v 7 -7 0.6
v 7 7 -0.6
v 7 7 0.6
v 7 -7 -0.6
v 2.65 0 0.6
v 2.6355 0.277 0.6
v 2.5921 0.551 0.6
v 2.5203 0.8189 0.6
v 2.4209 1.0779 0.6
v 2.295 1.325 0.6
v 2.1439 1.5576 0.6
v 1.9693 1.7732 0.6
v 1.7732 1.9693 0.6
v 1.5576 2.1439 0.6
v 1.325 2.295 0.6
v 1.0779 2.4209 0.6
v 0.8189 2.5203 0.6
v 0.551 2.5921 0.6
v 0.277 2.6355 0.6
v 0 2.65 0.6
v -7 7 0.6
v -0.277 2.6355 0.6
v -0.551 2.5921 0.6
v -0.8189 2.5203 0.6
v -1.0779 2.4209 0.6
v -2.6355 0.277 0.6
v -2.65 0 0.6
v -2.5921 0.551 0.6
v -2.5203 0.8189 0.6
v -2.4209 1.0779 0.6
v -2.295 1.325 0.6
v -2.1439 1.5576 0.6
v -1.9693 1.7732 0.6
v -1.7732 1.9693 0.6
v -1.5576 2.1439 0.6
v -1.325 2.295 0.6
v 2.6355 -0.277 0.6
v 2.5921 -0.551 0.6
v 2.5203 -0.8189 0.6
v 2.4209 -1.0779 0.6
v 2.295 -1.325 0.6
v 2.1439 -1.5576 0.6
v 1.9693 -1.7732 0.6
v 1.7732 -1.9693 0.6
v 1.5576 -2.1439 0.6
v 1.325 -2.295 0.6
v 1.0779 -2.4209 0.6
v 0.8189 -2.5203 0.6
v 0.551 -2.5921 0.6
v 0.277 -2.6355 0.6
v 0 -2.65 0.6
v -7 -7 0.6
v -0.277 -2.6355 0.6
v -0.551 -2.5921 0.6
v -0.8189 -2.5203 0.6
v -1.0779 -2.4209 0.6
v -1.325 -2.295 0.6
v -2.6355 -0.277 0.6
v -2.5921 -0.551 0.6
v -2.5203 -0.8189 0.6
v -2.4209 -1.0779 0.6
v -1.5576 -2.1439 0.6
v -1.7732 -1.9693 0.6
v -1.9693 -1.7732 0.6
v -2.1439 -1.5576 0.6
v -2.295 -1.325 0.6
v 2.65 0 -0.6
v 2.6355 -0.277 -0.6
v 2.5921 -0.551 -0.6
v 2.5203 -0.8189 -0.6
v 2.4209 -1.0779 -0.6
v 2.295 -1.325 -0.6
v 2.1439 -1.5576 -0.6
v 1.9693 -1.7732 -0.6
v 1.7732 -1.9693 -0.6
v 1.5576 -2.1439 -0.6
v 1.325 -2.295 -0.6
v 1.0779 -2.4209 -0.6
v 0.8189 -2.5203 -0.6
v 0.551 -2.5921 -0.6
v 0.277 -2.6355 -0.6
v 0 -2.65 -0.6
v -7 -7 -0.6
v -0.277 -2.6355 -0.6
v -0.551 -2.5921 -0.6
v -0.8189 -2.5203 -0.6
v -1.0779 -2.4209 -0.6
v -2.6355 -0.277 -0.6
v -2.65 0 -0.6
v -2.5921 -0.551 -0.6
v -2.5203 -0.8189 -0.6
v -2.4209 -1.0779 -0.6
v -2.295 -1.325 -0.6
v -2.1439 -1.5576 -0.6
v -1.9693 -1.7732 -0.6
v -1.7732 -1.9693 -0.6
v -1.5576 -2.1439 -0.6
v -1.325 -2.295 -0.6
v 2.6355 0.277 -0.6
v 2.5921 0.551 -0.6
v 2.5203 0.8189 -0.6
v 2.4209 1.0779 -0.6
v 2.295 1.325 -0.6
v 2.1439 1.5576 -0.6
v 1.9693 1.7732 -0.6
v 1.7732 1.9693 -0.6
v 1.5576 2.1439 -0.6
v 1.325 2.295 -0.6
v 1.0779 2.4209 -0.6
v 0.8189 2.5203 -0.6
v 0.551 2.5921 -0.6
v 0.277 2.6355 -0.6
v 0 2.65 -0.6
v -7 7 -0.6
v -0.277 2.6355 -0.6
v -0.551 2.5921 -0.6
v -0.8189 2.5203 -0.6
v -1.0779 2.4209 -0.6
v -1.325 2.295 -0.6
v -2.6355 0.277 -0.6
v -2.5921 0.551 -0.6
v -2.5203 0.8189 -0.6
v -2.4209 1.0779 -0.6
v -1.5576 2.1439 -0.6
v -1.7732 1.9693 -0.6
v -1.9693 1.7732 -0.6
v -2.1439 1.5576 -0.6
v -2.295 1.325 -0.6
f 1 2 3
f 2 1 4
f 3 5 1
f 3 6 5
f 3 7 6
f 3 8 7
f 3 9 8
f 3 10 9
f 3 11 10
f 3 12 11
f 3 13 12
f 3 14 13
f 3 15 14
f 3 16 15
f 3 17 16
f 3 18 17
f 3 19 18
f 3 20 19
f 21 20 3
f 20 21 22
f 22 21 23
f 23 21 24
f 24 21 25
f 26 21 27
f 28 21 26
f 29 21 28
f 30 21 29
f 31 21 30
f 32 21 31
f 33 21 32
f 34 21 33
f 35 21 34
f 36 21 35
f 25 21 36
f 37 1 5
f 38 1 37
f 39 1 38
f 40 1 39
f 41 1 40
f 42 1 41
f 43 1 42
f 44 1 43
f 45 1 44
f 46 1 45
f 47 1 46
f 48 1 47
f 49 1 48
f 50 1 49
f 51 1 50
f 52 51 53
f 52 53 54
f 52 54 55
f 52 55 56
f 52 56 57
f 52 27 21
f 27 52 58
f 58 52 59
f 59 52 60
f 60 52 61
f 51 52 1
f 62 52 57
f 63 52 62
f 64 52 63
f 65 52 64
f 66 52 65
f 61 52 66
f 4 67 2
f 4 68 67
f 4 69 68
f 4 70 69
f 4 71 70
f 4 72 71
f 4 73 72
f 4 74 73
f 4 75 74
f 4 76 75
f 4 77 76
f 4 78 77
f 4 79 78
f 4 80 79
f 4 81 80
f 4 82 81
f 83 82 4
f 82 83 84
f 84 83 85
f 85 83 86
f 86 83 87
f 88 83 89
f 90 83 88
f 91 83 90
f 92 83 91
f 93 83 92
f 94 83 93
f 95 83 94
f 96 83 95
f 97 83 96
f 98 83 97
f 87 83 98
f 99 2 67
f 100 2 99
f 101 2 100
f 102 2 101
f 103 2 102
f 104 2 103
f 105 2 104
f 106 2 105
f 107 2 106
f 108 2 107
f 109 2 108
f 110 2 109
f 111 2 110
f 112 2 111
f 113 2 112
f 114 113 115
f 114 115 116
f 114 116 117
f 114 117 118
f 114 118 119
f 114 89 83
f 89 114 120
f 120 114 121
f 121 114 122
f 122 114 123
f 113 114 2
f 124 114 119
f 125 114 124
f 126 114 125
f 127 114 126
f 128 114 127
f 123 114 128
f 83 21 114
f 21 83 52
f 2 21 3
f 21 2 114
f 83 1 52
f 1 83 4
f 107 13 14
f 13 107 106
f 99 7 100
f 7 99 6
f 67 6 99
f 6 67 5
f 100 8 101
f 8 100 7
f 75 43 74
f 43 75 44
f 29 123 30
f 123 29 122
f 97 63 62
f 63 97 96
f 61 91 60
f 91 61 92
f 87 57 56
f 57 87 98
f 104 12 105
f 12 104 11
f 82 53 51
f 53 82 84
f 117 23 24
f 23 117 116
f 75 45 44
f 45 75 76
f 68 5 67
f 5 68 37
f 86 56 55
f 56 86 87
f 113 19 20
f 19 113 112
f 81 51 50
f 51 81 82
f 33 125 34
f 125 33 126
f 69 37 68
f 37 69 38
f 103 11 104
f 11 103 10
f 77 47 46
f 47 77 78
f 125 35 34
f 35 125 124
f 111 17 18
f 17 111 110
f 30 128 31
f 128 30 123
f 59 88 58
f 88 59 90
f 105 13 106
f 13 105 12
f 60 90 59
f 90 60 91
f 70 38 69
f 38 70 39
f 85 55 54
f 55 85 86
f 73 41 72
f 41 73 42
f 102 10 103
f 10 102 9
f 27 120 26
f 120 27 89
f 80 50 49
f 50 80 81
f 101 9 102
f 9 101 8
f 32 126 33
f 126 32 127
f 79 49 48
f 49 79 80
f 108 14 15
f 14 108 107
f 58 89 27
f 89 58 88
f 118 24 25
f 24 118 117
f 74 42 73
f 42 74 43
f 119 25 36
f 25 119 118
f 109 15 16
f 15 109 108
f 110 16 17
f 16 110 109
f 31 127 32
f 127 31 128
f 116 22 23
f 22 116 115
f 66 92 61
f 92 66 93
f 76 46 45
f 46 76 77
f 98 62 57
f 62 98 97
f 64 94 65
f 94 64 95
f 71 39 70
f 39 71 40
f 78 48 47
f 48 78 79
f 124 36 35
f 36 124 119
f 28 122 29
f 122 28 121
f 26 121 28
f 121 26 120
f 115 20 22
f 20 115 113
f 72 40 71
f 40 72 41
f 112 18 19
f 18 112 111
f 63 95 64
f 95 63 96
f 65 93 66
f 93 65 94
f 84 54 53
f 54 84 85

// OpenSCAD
// Square mounting washer.
$fn = 60;
eps = 0.02;
hole_d = 5.3;
side = 14;
thickness = 1.2;
difference() {
    cube([side,side,thickness],center=true);
    translate([0,0,-thickness/2-eps]) cylinder(d=hole_d,h=thickness+2*eps);
}
